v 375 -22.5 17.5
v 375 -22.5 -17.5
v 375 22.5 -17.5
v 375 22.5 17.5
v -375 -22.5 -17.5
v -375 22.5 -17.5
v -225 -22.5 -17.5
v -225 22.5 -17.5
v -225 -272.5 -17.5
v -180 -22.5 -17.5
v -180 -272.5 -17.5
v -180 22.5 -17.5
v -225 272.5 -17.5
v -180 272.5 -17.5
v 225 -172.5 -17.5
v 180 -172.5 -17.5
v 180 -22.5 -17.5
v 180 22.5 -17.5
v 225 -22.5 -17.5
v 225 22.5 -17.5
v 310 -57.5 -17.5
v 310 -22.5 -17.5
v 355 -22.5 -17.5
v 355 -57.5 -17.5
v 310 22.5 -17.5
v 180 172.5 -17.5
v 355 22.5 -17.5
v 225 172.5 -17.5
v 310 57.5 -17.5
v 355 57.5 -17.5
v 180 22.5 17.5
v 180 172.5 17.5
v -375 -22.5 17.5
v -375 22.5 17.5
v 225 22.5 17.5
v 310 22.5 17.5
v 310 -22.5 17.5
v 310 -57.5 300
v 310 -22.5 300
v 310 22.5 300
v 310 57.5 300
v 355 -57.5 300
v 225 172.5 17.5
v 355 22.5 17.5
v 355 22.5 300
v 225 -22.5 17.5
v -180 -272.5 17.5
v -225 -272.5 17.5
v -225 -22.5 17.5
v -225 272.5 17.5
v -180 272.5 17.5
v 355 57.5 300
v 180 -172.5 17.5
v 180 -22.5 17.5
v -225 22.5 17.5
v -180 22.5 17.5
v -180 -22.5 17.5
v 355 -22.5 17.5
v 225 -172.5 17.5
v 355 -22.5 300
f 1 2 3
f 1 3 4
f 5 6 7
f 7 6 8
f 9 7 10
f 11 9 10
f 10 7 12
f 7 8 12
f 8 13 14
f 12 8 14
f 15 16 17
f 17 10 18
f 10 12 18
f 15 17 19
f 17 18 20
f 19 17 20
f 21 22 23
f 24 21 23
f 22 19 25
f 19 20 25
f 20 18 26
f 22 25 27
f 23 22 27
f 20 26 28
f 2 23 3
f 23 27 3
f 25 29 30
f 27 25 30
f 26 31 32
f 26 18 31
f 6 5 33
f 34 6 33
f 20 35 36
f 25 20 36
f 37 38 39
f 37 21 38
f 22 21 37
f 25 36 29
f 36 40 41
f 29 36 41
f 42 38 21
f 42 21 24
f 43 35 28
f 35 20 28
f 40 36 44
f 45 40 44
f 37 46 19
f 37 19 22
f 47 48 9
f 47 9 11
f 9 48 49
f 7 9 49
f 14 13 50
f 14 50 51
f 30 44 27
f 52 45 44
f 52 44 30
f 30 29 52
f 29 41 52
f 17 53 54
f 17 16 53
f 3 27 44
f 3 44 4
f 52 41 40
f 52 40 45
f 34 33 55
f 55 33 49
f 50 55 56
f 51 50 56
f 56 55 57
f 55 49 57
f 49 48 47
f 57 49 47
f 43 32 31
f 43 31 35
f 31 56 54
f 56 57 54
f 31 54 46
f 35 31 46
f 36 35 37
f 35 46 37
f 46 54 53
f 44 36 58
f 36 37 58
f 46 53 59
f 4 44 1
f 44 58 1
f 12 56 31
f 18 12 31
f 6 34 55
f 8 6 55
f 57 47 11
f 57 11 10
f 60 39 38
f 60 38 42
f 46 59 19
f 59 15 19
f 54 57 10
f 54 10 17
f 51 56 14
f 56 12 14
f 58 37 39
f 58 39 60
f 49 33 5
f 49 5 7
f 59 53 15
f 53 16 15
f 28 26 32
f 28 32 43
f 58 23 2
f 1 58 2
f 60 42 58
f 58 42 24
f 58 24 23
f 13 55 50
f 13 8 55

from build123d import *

# Parameters (mm, degrees)
F0_W          = 750
F0_H          = 35
F1_DEPTH      = 22.5
F2_W          = 45
F2_H          = 150
F2_H_2        = 250
F3_DEPTH      = 17.5
F4_W          = 45
F4_H          = 35
F5_DEPTH      = 300
F5_DEPTH_BACK = 17.5


with BuildPart() as f1:
    # F0 (on Front) → F1 (new body, symmetric)
    with BuildSketch(Plane.XZ):
        Rectangle(F0_W, F0_H)
    extrude(amount=F1_DEPTH, both=True)

    # F2 (on Top) → F3 (join, symmetric)
    with BuildSketch(Plane.XY):
        with Locations((202.5, 97.5)):
            Rectangle(F2_W, F2_H)
        with Locations((202.5, -97.5)):
            Rectangle(F2_W, F2_H)
        with Locations((-202.5, 147.5)):
            Rectangle(F2_W, F2_H_2)
        with Locations((-202.5, -147.5)):
            Rectangle(F2_W, F2_H_2)
    extrude(amount=F3_DEPTH, both=True)

    # F4 (on Top) → F5 (join, two sides)
    with BuildSketch(Plane.XY) as f5_sk:
        with Locations((332.5, 40)):
            Rectangle(F4_W, F4_H)
        with Locations((332.5, -40)):
            Rectangle(F4_W, F4_H)
    extrude(amount=F5_DEPTH)
    extrude(f5_sk.sketch, amount=-F5_DEPTH_BACK)


solid = f1.part
